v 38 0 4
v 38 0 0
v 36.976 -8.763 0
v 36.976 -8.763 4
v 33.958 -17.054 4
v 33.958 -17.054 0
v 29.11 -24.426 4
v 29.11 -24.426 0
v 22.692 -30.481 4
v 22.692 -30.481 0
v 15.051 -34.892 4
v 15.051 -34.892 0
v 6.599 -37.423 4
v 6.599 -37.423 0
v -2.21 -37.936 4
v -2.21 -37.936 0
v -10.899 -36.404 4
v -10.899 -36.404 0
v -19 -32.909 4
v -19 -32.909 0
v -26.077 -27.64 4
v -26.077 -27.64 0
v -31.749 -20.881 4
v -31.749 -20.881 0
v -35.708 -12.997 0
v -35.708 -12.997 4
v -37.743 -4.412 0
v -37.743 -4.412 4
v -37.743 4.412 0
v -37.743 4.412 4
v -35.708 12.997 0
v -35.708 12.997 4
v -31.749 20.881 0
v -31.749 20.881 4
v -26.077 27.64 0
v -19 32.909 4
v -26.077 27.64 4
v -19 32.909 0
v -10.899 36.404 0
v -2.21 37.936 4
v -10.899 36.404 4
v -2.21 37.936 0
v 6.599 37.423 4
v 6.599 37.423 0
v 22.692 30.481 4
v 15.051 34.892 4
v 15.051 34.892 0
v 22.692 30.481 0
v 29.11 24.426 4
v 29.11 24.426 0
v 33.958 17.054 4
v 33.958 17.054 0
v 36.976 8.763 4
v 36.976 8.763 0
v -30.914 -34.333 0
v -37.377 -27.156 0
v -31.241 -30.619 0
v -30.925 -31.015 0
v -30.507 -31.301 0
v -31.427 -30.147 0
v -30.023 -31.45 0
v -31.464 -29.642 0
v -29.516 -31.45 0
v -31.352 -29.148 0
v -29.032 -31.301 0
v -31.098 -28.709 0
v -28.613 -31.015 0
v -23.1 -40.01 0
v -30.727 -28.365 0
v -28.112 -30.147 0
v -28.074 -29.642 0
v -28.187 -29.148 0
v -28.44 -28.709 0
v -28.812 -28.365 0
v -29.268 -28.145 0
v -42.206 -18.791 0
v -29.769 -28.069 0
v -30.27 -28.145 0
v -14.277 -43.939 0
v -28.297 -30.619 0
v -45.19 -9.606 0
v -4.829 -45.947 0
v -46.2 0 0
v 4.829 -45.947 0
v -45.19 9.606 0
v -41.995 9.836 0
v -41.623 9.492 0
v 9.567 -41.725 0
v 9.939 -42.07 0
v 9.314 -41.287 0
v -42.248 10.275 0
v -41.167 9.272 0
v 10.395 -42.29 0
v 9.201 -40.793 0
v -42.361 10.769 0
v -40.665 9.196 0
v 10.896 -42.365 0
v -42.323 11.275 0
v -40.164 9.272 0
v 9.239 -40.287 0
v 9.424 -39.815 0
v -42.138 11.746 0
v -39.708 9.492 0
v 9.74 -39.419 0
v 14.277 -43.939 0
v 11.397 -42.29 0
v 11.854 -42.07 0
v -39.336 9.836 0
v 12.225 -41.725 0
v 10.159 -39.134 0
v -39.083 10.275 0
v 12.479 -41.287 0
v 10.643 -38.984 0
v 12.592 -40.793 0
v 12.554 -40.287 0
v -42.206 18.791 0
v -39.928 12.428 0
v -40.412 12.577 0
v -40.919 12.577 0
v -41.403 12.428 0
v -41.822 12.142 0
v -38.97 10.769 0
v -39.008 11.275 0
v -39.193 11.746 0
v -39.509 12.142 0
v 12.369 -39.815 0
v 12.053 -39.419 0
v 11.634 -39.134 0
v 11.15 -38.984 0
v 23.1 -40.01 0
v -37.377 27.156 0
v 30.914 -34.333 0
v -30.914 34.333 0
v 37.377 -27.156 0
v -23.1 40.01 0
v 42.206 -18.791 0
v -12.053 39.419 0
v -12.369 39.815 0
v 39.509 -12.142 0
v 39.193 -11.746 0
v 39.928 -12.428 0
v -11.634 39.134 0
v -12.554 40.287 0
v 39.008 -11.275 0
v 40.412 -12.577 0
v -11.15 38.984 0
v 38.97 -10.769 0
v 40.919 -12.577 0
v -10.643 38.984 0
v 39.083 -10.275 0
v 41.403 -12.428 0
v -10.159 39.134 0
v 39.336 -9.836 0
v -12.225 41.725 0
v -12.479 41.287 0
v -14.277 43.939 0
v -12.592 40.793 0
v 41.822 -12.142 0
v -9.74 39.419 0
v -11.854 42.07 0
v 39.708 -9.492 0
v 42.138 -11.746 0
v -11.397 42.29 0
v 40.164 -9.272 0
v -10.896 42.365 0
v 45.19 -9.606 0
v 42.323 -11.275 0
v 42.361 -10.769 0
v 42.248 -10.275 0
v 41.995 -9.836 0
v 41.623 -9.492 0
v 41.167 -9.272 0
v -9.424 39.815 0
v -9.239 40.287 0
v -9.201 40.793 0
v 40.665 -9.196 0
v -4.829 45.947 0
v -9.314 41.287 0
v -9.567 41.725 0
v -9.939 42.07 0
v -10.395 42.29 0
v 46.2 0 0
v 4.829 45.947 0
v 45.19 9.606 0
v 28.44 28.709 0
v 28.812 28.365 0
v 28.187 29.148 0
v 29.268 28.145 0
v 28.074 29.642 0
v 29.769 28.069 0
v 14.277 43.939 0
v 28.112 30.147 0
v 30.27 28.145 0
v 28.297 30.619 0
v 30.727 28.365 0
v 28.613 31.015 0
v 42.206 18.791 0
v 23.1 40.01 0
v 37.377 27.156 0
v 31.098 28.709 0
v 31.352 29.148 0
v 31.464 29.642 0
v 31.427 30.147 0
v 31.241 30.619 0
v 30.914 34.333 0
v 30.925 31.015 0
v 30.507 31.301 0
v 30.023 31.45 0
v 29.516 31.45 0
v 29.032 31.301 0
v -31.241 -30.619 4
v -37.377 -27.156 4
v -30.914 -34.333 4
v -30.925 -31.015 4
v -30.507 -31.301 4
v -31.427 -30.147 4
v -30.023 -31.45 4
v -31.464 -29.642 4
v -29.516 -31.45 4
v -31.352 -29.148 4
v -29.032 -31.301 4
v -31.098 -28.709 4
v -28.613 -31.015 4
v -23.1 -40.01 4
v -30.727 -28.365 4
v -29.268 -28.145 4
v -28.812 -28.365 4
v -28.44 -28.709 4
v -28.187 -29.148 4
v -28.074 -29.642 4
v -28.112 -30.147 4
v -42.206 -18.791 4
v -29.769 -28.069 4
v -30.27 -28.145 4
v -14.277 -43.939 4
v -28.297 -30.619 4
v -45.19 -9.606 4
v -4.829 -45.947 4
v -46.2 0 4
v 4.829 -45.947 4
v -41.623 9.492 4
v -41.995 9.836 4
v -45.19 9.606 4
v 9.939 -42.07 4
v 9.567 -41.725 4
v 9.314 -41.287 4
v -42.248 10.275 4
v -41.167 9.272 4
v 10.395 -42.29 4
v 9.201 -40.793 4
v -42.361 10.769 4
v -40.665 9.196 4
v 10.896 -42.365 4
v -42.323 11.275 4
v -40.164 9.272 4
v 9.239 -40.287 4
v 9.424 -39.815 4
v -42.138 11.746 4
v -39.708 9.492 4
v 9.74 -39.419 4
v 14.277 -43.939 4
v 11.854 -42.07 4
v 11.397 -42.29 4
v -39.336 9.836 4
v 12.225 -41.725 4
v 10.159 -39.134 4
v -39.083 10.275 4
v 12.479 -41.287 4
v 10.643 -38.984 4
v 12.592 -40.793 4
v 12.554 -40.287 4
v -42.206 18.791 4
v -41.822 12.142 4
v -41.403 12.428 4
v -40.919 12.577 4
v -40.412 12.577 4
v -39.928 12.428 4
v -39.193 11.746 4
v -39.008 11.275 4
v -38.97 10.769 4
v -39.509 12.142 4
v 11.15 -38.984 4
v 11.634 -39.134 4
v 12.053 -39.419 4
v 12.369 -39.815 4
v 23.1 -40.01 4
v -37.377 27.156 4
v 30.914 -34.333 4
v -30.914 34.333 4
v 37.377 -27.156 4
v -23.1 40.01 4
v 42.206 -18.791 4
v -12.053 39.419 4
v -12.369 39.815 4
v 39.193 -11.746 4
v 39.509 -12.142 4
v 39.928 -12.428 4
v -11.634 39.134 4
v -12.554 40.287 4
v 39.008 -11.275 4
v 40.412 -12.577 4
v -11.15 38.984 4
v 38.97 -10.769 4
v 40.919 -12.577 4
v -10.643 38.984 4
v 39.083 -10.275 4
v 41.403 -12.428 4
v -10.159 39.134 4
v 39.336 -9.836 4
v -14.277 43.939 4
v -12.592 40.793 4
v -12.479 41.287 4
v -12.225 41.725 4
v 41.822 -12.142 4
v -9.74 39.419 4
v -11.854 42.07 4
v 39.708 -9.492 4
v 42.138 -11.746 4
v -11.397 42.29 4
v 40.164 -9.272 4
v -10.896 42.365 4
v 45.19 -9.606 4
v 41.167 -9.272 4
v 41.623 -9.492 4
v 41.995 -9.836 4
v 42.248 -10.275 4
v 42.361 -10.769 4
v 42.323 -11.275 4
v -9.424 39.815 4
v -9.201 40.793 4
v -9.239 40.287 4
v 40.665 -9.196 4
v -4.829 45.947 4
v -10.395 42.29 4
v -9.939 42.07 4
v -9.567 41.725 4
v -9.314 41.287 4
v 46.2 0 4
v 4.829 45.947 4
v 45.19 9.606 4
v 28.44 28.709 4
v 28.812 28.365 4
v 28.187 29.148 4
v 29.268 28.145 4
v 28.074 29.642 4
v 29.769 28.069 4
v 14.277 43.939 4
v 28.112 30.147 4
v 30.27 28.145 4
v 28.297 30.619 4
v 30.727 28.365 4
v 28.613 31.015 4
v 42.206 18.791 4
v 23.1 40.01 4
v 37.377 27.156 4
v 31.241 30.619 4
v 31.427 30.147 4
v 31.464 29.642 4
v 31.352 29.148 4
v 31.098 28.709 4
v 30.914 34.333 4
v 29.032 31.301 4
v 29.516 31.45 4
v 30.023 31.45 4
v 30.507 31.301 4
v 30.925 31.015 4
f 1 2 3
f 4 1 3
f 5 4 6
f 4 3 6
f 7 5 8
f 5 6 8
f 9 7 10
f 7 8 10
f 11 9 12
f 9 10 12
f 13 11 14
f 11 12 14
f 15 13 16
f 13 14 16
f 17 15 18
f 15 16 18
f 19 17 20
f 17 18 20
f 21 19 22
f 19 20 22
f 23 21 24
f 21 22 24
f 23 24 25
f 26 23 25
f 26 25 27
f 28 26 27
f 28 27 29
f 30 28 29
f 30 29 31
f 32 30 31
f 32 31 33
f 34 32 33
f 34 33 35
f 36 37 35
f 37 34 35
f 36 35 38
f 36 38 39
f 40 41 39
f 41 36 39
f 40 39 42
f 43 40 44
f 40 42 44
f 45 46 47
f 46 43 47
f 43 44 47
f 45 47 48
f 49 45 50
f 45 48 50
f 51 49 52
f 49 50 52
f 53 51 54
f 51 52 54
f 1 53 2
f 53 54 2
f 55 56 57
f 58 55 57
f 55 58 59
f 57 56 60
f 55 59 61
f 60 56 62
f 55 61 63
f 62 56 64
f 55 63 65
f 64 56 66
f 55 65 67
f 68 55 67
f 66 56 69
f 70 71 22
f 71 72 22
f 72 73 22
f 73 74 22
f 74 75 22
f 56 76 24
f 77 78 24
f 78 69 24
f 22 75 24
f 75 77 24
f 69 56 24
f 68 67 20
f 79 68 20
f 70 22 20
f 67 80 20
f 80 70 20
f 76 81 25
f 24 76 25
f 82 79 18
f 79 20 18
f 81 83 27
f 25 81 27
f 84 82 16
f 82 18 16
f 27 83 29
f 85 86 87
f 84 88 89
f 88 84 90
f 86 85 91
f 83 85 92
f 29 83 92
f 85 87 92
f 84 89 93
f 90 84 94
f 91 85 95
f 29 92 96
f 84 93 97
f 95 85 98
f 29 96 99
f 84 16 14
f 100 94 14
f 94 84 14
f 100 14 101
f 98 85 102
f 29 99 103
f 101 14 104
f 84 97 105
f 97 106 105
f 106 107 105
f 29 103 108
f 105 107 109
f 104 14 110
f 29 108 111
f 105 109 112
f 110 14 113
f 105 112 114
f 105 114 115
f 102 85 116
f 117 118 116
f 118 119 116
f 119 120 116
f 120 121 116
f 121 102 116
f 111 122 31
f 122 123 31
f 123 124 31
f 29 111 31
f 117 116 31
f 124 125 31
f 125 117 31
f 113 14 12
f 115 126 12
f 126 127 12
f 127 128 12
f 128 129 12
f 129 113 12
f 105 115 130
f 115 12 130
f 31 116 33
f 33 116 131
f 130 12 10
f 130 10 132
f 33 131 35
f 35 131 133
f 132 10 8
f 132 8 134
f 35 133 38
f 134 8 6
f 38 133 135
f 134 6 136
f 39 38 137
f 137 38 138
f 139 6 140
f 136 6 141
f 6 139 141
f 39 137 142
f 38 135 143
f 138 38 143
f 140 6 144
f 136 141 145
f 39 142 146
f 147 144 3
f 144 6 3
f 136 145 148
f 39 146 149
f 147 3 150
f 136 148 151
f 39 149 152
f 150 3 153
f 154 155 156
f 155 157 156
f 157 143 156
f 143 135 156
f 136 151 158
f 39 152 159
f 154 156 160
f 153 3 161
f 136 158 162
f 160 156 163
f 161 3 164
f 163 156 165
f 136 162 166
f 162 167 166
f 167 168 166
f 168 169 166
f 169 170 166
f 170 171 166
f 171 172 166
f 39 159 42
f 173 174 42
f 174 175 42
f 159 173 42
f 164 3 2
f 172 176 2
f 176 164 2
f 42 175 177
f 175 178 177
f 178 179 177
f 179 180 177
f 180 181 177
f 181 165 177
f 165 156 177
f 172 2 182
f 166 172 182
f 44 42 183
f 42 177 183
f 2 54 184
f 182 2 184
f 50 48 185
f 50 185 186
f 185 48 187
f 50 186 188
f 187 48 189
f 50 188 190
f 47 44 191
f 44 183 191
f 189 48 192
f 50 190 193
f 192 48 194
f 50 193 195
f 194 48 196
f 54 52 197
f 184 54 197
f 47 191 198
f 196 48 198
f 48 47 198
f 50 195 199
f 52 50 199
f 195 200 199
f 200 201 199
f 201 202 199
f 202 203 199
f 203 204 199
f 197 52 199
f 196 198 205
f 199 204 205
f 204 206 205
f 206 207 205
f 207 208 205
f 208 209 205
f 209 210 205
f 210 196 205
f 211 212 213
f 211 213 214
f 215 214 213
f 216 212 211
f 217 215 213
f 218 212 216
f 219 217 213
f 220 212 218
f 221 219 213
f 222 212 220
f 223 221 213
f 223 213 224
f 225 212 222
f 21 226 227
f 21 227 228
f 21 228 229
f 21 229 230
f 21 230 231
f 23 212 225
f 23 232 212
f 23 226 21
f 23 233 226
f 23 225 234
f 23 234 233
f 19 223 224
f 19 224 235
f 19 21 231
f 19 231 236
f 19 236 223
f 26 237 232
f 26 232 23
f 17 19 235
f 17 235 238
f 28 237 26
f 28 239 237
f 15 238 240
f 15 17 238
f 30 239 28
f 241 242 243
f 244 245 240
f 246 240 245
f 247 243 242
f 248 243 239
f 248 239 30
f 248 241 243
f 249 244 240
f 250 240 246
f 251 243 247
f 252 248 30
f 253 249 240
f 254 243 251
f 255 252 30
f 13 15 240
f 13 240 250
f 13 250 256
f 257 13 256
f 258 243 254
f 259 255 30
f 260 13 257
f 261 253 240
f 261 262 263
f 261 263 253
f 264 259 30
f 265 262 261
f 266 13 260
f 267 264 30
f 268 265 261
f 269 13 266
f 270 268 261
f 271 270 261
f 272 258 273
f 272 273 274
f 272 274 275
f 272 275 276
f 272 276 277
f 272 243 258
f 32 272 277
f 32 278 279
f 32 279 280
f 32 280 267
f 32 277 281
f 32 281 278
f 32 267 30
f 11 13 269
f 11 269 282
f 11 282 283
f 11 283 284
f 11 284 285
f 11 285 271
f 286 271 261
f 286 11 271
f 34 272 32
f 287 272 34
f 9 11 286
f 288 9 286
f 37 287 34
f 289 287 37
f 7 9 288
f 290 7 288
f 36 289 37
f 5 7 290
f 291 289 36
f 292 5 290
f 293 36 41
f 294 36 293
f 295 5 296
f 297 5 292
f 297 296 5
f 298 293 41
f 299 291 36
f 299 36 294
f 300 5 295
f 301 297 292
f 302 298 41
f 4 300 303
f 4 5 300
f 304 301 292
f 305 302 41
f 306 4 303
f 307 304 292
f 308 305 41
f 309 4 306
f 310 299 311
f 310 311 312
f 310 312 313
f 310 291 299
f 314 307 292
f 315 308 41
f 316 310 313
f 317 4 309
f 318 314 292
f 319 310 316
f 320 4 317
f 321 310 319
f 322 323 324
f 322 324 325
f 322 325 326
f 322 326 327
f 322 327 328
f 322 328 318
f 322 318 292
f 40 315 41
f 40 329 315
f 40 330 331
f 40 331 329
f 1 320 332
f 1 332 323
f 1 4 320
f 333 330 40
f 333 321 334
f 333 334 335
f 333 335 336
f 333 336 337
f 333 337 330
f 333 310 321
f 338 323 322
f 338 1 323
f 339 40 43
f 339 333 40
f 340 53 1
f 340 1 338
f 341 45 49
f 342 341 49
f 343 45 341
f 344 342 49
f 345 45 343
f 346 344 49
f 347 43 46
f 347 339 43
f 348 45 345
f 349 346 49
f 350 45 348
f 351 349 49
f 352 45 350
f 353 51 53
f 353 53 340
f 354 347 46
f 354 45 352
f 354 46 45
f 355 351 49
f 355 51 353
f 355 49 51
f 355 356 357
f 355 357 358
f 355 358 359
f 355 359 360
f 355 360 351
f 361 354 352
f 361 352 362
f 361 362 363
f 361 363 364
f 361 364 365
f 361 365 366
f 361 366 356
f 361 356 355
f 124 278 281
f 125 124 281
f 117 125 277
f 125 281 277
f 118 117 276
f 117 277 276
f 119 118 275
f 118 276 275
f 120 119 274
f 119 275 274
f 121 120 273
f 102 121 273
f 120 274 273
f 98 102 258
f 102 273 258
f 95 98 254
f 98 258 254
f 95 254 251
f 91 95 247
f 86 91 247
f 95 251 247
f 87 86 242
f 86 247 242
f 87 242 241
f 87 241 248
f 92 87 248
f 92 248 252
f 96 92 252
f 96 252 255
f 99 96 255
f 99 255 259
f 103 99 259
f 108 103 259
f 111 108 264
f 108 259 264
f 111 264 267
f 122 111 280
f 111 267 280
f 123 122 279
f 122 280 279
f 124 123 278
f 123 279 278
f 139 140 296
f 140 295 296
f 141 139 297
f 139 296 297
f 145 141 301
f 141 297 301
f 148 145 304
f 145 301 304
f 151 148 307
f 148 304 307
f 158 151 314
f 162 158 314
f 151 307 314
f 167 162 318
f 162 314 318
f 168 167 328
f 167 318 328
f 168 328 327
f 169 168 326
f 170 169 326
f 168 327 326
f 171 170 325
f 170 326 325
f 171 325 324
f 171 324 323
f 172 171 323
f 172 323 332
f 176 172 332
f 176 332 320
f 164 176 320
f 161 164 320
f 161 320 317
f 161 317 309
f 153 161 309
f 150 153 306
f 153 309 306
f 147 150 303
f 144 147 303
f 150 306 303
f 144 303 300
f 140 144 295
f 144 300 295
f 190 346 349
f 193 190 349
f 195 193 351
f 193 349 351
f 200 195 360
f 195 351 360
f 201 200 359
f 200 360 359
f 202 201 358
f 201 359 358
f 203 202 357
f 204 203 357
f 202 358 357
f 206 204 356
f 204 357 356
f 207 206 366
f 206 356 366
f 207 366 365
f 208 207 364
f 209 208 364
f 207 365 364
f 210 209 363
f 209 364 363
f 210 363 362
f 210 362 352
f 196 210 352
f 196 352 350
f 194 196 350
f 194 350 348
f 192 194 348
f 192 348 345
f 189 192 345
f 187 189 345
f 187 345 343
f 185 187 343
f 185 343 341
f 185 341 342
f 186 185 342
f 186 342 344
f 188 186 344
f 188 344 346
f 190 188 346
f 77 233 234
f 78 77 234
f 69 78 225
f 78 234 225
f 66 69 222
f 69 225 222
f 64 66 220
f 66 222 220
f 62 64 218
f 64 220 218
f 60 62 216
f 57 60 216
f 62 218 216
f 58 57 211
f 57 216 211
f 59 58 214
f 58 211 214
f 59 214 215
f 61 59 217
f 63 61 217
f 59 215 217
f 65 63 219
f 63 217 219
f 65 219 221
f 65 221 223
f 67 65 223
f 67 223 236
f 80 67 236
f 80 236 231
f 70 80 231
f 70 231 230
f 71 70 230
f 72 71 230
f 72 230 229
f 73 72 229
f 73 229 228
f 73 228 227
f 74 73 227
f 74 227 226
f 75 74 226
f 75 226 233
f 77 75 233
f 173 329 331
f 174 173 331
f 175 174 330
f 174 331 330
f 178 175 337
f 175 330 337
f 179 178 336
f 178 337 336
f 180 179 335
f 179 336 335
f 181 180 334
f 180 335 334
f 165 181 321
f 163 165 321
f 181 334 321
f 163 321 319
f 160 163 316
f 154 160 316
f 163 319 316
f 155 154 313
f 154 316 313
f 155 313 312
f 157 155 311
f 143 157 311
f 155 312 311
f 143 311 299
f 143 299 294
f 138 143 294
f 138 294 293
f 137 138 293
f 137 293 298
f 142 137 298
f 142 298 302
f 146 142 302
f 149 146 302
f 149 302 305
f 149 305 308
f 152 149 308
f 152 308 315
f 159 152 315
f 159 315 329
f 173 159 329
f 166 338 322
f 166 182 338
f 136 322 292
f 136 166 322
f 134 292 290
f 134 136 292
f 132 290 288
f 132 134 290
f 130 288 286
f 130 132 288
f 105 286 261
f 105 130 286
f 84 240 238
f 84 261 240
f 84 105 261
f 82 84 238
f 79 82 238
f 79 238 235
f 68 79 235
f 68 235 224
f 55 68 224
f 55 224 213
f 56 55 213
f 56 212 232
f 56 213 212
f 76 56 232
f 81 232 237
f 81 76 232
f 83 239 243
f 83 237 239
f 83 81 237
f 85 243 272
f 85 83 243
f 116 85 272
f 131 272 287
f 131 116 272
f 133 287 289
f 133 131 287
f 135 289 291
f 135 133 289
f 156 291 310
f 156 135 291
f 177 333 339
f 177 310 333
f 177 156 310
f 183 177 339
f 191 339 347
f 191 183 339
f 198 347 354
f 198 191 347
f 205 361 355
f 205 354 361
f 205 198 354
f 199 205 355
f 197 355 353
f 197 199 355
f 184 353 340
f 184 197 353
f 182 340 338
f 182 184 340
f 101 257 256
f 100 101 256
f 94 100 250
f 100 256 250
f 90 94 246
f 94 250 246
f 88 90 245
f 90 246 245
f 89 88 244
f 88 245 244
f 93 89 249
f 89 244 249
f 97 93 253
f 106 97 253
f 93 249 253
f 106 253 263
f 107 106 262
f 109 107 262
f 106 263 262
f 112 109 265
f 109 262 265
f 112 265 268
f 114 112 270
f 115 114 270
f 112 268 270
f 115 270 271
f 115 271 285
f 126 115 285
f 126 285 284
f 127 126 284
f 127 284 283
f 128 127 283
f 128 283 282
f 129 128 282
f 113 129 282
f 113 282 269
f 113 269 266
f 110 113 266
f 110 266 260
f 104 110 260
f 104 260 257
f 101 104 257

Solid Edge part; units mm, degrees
sketch "Sketch1" plane through (0, 0, 0) normal (0, 0, 1) x (1, 0, 0)
  circle A0 centre (0, 0) radius 38
  circle A1 centre (0, 0) radius 46.2
extrude "Protrusion1" add sketch "Sketch1" along normal blind 4
hole "Hole1" at (29.7692, 29.7692, 4) direction (0, 0, -1) diameter 3.4 end up to next
pattern_circular "Pattern1" count 6 over 360 about axis through (0, 0, 4) along (0, 0, -1) of "Hole1"
